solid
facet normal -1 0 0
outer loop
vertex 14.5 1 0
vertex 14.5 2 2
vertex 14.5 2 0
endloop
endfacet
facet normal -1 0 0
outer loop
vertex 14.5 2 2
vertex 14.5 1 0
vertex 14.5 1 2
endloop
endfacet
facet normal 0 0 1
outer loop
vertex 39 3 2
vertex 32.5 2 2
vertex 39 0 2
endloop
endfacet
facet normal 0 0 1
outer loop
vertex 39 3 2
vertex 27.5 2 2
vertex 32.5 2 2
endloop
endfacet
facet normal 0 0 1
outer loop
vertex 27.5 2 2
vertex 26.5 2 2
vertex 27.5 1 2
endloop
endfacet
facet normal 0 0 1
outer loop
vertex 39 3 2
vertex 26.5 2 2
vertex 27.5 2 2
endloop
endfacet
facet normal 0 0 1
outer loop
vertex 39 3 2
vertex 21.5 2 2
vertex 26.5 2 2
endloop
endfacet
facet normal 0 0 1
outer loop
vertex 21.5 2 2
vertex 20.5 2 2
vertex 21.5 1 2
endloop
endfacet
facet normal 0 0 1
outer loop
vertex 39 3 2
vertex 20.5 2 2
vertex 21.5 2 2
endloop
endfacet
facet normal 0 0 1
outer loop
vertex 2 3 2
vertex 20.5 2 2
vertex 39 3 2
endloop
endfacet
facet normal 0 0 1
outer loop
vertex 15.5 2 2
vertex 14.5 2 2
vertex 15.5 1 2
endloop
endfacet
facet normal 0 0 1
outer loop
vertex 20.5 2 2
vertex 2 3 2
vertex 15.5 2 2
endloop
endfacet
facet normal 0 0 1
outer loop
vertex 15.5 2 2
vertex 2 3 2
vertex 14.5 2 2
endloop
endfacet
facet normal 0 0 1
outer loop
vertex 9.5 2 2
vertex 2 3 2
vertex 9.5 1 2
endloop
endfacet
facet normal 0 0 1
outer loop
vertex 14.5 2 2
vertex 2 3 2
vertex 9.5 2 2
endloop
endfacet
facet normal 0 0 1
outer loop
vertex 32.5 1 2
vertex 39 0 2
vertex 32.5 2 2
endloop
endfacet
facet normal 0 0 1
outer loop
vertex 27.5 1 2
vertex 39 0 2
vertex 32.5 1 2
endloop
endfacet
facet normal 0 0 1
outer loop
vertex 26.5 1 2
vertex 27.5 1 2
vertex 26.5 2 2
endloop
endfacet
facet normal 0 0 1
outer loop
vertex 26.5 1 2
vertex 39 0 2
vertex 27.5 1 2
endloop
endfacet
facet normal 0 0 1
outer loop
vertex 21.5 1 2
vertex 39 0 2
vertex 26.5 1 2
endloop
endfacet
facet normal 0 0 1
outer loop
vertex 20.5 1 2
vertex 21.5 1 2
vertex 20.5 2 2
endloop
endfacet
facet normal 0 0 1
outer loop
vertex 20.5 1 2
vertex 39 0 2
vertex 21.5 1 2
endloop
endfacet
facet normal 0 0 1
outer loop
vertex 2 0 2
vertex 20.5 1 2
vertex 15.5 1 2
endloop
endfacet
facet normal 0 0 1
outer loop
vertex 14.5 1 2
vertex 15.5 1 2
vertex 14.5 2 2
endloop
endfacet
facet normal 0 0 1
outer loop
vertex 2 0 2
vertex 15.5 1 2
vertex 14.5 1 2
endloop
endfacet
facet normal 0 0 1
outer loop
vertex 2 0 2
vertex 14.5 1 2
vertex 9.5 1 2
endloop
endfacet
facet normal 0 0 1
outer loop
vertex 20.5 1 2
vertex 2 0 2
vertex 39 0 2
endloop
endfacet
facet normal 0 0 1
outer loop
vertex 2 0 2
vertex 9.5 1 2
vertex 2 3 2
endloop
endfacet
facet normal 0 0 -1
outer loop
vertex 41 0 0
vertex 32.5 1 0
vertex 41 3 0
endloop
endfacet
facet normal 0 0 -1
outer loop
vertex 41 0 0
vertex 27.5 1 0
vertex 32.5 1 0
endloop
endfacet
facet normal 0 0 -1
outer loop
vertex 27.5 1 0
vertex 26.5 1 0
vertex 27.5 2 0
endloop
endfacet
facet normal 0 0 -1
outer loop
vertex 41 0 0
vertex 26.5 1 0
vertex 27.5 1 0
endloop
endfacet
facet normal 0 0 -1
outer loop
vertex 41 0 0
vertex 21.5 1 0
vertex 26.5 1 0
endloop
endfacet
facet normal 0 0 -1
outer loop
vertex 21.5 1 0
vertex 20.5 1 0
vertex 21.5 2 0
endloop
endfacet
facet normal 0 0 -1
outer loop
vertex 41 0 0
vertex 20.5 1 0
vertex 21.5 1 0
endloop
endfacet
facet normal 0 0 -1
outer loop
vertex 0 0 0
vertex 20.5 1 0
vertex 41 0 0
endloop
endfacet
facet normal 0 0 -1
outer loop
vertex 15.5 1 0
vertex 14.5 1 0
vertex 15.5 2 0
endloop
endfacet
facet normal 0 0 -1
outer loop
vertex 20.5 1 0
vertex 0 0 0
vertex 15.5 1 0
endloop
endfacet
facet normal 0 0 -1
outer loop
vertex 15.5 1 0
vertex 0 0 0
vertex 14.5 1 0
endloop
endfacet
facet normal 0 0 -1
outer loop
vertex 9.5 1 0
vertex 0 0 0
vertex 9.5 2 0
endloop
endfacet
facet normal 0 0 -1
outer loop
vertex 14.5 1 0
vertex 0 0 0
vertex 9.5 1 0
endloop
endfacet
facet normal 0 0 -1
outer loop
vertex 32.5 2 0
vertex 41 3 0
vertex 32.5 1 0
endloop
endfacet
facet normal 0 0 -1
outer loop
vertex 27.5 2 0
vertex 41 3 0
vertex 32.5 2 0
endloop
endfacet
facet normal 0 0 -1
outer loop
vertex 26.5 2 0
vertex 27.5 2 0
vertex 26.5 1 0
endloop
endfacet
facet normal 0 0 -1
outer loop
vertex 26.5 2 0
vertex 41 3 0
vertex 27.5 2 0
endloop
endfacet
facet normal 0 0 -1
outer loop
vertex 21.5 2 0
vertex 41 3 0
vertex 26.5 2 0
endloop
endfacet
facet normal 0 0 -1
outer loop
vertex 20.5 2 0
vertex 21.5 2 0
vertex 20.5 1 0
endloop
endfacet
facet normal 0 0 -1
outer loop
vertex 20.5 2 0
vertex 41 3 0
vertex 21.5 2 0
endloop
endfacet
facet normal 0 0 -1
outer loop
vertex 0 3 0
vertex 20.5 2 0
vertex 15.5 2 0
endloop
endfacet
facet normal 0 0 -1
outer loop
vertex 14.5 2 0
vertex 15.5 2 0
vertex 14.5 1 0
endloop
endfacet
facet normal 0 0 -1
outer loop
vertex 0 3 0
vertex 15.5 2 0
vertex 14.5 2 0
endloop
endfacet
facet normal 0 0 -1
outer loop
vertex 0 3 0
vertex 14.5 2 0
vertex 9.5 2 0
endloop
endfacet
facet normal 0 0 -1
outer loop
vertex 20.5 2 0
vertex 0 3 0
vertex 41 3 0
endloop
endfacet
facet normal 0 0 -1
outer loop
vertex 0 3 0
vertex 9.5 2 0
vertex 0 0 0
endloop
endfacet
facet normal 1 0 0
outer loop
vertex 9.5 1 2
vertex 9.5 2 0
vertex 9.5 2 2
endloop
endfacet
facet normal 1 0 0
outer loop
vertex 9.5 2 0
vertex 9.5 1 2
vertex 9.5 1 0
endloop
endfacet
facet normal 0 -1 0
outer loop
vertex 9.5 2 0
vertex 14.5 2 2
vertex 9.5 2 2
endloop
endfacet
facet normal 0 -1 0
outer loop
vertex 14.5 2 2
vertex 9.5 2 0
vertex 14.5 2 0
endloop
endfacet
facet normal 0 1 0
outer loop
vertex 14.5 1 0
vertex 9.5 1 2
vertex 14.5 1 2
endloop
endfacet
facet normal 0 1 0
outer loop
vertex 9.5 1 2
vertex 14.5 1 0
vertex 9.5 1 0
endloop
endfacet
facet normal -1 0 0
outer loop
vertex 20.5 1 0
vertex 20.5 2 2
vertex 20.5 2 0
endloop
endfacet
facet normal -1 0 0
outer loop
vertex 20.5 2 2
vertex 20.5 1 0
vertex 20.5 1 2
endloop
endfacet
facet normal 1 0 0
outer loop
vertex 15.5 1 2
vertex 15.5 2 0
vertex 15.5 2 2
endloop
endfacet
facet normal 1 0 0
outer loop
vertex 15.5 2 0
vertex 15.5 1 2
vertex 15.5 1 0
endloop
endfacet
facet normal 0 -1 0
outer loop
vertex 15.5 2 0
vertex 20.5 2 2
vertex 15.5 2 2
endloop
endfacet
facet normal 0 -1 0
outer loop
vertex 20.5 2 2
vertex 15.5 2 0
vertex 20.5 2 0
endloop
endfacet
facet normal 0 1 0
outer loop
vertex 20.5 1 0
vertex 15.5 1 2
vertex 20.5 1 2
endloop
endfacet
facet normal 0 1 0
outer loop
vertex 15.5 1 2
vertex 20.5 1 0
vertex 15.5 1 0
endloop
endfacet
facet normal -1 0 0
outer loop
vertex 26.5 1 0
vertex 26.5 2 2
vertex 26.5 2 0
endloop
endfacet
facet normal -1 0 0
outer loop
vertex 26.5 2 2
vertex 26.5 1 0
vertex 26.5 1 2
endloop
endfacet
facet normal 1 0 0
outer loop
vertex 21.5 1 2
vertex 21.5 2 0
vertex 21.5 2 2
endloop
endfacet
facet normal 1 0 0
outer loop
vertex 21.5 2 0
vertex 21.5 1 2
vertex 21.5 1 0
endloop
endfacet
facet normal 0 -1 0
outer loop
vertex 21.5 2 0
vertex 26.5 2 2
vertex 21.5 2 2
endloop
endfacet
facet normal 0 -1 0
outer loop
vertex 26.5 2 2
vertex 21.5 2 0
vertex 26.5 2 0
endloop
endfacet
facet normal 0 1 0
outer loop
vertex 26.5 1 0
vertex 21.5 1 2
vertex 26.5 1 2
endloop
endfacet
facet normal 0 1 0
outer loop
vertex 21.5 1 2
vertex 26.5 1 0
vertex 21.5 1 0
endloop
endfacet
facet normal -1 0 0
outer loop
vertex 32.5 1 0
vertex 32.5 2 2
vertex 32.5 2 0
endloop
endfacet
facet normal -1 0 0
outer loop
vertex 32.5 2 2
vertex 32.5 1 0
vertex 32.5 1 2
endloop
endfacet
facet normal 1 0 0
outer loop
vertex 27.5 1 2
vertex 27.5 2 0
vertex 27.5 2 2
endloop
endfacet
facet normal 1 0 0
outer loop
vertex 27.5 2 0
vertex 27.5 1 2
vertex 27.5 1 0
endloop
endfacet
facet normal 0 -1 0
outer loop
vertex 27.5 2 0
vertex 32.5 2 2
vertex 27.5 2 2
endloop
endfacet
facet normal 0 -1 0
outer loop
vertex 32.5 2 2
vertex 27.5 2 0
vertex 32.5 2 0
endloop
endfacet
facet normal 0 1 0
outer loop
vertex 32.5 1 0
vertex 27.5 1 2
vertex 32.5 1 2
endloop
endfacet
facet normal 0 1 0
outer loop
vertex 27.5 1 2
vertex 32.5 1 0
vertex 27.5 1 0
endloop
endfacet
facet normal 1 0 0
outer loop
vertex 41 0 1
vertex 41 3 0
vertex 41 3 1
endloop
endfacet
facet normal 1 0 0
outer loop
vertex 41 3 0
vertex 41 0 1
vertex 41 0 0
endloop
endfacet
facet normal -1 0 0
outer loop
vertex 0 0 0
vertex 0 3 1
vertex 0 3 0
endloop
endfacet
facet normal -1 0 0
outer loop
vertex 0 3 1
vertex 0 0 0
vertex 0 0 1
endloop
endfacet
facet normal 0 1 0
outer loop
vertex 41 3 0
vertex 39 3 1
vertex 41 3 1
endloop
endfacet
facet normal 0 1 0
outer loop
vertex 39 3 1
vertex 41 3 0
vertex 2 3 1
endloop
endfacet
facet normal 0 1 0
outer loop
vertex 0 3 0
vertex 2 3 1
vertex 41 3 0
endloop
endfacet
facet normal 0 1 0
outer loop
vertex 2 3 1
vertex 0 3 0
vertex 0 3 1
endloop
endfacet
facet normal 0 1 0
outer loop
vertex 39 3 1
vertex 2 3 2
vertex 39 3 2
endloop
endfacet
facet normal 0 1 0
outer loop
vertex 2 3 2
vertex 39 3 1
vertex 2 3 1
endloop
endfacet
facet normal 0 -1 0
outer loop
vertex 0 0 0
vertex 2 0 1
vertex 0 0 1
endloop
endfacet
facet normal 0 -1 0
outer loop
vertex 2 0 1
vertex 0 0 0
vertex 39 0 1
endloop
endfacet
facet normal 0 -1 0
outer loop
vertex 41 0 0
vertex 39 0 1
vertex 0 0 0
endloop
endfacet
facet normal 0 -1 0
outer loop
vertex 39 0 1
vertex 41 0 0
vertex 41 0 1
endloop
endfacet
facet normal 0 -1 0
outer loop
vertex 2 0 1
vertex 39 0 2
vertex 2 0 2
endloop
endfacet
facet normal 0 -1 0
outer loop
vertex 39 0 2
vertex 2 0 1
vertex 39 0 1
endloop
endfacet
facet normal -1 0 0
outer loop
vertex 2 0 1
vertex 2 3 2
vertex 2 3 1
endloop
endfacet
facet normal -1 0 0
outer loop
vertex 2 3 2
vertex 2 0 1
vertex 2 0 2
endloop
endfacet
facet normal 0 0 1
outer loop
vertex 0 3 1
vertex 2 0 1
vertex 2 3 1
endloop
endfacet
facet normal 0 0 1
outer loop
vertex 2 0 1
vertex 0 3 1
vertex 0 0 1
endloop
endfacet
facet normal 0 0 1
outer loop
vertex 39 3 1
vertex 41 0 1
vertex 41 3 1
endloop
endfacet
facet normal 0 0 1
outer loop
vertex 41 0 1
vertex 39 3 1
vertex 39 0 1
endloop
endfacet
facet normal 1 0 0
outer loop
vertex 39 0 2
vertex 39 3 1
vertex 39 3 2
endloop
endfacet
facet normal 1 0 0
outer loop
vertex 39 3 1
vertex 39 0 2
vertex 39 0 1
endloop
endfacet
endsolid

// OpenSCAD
distanceBetweenRings = 35;
insetLength = 1;
insetWidth = 3;

width = 3;
overlap = 2;


lowerOverLength = distanceBetweenRings + 2 * insetLength;
overLength = lowerOverLength + 2 * overlap;



workableSpace = overLength - overlap - insetLength - 4;

holeLength = 5;
unitLength = holeLength + 1;
numberOfHoles = (workableSpace / unitLength) - 1;

startingPoint = (overLength - workableSpace) / 2;

difference() {

    cube([overLength, width, 2]);
    negative();

    translate([lowerOverLength + overlap + insetLength + 1, width,0]) 
    rotate([0,0,180]) 
        negative();

    for (i=[1:numberOfHoles])  {
        #translate([startingPoint + (i * unitLength),1,0]) cube([holeLength,1,2]);
    }

}

module negative() {
    union() {
        translate([0, 0,1]) cube([overlap, width, 1]);
    }
}
